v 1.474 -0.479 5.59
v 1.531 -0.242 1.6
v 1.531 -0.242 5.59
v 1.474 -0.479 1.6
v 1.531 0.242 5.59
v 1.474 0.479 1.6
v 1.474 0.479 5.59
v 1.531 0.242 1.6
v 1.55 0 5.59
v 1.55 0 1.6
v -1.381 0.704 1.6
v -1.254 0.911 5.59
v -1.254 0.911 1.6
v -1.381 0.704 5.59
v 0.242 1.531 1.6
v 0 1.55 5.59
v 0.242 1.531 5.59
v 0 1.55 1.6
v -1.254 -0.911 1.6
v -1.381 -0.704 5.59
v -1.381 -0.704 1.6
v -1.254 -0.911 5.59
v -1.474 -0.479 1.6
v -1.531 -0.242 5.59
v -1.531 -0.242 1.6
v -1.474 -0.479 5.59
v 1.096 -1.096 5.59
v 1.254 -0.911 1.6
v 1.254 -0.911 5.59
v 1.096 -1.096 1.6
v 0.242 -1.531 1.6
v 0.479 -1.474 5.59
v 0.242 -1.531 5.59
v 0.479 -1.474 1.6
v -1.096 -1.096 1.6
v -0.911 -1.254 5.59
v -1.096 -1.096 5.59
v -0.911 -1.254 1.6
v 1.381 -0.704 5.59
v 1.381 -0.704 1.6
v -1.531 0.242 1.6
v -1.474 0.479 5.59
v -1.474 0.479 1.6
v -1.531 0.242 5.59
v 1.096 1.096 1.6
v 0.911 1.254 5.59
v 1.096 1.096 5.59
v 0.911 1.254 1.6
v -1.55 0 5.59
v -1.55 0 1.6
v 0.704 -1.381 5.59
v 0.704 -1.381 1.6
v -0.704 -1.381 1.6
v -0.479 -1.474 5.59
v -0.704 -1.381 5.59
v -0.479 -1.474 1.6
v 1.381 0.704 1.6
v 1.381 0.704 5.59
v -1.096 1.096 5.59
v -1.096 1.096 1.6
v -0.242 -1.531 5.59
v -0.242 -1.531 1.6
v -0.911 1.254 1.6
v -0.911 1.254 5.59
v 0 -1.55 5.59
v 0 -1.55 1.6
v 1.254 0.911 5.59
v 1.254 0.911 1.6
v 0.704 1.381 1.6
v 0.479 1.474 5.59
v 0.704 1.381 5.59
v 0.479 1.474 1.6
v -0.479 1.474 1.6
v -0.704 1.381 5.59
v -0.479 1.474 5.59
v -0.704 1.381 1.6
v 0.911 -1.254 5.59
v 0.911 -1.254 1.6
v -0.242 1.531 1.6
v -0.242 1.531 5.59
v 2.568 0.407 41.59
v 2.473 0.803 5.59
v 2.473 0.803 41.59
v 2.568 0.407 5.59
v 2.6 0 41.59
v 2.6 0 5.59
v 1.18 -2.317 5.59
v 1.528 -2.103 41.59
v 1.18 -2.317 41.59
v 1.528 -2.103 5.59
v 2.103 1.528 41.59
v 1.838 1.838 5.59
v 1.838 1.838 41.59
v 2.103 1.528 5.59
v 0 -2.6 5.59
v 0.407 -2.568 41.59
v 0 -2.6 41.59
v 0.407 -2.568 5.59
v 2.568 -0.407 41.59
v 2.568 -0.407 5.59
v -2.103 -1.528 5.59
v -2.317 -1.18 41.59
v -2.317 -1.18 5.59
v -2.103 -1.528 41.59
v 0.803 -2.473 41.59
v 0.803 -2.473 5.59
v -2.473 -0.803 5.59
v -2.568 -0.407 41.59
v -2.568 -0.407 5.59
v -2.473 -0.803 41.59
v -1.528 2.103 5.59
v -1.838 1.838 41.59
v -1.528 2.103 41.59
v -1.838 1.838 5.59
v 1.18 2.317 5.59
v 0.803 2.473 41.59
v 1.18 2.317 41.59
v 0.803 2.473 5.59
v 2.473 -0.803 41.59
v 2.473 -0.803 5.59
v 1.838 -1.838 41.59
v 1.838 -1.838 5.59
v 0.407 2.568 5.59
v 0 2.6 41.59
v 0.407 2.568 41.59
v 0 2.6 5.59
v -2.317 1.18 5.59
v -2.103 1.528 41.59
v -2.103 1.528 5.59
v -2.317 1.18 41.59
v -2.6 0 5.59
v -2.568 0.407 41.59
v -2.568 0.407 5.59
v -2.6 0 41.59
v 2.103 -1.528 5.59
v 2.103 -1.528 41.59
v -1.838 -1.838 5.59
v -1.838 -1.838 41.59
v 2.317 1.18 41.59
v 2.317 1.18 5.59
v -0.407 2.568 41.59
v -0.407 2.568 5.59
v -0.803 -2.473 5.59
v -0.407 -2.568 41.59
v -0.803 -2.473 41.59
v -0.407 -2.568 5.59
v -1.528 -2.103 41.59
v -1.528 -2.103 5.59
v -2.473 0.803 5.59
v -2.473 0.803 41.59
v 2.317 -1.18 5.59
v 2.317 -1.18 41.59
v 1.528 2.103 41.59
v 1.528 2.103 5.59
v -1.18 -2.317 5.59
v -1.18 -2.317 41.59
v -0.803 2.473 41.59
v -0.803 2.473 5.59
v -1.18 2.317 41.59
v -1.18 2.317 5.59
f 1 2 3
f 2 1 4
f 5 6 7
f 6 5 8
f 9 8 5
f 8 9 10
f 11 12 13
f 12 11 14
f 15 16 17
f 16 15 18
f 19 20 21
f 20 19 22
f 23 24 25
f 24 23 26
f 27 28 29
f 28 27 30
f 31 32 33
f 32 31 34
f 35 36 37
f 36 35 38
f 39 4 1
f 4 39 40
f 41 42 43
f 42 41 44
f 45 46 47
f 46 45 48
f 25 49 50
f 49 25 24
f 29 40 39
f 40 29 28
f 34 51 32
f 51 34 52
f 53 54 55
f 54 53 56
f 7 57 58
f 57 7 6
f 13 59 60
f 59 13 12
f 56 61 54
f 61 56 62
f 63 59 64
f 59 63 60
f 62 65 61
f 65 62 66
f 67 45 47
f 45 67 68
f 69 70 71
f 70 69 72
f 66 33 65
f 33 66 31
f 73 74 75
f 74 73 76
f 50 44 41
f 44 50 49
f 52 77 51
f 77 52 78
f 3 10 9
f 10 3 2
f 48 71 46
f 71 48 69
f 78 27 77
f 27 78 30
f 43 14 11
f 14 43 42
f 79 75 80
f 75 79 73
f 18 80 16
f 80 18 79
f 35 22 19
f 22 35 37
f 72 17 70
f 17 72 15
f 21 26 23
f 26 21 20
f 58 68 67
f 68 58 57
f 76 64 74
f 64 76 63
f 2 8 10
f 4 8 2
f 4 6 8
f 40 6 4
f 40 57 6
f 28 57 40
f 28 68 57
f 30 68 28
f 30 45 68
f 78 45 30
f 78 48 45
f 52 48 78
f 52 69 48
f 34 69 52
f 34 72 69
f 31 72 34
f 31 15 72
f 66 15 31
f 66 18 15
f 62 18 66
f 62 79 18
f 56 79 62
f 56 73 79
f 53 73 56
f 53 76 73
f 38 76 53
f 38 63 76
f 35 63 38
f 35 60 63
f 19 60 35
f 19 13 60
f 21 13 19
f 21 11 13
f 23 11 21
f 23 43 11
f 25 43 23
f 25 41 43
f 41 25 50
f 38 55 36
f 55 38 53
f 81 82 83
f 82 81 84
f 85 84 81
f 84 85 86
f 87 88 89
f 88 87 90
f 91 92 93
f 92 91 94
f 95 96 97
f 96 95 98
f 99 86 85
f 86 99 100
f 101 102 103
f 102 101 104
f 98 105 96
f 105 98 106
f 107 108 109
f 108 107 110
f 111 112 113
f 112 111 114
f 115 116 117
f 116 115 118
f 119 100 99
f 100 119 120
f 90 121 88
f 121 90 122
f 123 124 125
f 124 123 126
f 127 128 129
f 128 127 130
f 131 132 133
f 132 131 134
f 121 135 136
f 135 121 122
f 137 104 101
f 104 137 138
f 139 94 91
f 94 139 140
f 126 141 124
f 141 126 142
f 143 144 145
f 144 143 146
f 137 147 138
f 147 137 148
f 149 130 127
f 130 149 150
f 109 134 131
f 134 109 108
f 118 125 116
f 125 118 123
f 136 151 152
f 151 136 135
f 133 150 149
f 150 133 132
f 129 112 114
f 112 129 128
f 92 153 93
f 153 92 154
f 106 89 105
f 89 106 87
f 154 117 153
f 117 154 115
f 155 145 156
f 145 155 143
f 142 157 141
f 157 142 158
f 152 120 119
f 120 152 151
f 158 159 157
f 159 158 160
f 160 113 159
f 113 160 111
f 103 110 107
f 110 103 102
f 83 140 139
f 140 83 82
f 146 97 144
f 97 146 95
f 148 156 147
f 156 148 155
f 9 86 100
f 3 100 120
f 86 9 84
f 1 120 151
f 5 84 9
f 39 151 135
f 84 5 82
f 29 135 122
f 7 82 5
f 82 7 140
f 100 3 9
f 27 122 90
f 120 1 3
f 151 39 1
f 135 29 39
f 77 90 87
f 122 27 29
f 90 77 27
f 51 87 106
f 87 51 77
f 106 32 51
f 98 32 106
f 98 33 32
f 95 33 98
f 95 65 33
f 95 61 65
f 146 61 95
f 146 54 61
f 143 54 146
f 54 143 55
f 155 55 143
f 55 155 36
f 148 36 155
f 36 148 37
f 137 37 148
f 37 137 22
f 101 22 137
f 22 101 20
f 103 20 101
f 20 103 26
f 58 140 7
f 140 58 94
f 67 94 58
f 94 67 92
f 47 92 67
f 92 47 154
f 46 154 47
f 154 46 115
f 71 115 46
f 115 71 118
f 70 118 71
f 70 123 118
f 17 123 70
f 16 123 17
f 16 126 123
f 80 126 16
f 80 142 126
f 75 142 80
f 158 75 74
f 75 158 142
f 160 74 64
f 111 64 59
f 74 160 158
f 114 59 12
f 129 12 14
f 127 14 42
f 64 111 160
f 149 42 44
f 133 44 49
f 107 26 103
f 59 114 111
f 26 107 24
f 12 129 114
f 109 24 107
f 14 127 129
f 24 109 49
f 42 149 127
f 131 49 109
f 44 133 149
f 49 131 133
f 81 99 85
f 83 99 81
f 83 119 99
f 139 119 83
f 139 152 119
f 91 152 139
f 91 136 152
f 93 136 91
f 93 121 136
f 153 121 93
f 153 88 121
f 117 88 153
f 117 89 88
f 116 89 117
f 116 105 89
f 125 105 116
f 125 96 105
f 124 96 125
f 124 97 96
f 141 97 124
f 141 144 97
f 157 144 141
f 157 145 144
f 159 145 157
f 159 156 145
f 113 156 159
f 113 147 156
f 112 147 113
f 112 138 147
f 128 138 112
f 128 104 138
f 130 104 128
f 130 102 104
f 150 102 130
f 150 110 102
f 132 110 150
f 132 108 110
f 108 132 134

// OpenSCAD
botPostDia = 3.1;
botPostHt  = 4;
postDia = 5.20; // including space
postHt  = 40;

if (0) difference() {
   translate([-1.5,-2.5,0]) form();
   postHole();
}
else {
   postHole();
}

module form() {
   // import("./files/Gloomhaven_Stalagmites.stl");
   import("./stalagmites-wout-posthole.stl");
}

module postHole() {
   translate([0,0,1.6])
      cylinder($fn=40, d=botPostDia, h=botPostHt);
   translate([0,0,1.6+botPostHt-0.01])
      cylinder($fn=40, d=postDia, h=postHt-botPostHt);

   // translate([0,-0.5,1.6]) cube([botPostDia/2+2, 1, 5]);
   // rotate([0,0,120]) translate([0,-0.5,1.6]) cube([botPostDia/2+2, 1, 5]);
   // rotate([0,0,240]) translate([0,-0.5,1.6]) cube([botPostDia/2+2, 1, 5]);
}
